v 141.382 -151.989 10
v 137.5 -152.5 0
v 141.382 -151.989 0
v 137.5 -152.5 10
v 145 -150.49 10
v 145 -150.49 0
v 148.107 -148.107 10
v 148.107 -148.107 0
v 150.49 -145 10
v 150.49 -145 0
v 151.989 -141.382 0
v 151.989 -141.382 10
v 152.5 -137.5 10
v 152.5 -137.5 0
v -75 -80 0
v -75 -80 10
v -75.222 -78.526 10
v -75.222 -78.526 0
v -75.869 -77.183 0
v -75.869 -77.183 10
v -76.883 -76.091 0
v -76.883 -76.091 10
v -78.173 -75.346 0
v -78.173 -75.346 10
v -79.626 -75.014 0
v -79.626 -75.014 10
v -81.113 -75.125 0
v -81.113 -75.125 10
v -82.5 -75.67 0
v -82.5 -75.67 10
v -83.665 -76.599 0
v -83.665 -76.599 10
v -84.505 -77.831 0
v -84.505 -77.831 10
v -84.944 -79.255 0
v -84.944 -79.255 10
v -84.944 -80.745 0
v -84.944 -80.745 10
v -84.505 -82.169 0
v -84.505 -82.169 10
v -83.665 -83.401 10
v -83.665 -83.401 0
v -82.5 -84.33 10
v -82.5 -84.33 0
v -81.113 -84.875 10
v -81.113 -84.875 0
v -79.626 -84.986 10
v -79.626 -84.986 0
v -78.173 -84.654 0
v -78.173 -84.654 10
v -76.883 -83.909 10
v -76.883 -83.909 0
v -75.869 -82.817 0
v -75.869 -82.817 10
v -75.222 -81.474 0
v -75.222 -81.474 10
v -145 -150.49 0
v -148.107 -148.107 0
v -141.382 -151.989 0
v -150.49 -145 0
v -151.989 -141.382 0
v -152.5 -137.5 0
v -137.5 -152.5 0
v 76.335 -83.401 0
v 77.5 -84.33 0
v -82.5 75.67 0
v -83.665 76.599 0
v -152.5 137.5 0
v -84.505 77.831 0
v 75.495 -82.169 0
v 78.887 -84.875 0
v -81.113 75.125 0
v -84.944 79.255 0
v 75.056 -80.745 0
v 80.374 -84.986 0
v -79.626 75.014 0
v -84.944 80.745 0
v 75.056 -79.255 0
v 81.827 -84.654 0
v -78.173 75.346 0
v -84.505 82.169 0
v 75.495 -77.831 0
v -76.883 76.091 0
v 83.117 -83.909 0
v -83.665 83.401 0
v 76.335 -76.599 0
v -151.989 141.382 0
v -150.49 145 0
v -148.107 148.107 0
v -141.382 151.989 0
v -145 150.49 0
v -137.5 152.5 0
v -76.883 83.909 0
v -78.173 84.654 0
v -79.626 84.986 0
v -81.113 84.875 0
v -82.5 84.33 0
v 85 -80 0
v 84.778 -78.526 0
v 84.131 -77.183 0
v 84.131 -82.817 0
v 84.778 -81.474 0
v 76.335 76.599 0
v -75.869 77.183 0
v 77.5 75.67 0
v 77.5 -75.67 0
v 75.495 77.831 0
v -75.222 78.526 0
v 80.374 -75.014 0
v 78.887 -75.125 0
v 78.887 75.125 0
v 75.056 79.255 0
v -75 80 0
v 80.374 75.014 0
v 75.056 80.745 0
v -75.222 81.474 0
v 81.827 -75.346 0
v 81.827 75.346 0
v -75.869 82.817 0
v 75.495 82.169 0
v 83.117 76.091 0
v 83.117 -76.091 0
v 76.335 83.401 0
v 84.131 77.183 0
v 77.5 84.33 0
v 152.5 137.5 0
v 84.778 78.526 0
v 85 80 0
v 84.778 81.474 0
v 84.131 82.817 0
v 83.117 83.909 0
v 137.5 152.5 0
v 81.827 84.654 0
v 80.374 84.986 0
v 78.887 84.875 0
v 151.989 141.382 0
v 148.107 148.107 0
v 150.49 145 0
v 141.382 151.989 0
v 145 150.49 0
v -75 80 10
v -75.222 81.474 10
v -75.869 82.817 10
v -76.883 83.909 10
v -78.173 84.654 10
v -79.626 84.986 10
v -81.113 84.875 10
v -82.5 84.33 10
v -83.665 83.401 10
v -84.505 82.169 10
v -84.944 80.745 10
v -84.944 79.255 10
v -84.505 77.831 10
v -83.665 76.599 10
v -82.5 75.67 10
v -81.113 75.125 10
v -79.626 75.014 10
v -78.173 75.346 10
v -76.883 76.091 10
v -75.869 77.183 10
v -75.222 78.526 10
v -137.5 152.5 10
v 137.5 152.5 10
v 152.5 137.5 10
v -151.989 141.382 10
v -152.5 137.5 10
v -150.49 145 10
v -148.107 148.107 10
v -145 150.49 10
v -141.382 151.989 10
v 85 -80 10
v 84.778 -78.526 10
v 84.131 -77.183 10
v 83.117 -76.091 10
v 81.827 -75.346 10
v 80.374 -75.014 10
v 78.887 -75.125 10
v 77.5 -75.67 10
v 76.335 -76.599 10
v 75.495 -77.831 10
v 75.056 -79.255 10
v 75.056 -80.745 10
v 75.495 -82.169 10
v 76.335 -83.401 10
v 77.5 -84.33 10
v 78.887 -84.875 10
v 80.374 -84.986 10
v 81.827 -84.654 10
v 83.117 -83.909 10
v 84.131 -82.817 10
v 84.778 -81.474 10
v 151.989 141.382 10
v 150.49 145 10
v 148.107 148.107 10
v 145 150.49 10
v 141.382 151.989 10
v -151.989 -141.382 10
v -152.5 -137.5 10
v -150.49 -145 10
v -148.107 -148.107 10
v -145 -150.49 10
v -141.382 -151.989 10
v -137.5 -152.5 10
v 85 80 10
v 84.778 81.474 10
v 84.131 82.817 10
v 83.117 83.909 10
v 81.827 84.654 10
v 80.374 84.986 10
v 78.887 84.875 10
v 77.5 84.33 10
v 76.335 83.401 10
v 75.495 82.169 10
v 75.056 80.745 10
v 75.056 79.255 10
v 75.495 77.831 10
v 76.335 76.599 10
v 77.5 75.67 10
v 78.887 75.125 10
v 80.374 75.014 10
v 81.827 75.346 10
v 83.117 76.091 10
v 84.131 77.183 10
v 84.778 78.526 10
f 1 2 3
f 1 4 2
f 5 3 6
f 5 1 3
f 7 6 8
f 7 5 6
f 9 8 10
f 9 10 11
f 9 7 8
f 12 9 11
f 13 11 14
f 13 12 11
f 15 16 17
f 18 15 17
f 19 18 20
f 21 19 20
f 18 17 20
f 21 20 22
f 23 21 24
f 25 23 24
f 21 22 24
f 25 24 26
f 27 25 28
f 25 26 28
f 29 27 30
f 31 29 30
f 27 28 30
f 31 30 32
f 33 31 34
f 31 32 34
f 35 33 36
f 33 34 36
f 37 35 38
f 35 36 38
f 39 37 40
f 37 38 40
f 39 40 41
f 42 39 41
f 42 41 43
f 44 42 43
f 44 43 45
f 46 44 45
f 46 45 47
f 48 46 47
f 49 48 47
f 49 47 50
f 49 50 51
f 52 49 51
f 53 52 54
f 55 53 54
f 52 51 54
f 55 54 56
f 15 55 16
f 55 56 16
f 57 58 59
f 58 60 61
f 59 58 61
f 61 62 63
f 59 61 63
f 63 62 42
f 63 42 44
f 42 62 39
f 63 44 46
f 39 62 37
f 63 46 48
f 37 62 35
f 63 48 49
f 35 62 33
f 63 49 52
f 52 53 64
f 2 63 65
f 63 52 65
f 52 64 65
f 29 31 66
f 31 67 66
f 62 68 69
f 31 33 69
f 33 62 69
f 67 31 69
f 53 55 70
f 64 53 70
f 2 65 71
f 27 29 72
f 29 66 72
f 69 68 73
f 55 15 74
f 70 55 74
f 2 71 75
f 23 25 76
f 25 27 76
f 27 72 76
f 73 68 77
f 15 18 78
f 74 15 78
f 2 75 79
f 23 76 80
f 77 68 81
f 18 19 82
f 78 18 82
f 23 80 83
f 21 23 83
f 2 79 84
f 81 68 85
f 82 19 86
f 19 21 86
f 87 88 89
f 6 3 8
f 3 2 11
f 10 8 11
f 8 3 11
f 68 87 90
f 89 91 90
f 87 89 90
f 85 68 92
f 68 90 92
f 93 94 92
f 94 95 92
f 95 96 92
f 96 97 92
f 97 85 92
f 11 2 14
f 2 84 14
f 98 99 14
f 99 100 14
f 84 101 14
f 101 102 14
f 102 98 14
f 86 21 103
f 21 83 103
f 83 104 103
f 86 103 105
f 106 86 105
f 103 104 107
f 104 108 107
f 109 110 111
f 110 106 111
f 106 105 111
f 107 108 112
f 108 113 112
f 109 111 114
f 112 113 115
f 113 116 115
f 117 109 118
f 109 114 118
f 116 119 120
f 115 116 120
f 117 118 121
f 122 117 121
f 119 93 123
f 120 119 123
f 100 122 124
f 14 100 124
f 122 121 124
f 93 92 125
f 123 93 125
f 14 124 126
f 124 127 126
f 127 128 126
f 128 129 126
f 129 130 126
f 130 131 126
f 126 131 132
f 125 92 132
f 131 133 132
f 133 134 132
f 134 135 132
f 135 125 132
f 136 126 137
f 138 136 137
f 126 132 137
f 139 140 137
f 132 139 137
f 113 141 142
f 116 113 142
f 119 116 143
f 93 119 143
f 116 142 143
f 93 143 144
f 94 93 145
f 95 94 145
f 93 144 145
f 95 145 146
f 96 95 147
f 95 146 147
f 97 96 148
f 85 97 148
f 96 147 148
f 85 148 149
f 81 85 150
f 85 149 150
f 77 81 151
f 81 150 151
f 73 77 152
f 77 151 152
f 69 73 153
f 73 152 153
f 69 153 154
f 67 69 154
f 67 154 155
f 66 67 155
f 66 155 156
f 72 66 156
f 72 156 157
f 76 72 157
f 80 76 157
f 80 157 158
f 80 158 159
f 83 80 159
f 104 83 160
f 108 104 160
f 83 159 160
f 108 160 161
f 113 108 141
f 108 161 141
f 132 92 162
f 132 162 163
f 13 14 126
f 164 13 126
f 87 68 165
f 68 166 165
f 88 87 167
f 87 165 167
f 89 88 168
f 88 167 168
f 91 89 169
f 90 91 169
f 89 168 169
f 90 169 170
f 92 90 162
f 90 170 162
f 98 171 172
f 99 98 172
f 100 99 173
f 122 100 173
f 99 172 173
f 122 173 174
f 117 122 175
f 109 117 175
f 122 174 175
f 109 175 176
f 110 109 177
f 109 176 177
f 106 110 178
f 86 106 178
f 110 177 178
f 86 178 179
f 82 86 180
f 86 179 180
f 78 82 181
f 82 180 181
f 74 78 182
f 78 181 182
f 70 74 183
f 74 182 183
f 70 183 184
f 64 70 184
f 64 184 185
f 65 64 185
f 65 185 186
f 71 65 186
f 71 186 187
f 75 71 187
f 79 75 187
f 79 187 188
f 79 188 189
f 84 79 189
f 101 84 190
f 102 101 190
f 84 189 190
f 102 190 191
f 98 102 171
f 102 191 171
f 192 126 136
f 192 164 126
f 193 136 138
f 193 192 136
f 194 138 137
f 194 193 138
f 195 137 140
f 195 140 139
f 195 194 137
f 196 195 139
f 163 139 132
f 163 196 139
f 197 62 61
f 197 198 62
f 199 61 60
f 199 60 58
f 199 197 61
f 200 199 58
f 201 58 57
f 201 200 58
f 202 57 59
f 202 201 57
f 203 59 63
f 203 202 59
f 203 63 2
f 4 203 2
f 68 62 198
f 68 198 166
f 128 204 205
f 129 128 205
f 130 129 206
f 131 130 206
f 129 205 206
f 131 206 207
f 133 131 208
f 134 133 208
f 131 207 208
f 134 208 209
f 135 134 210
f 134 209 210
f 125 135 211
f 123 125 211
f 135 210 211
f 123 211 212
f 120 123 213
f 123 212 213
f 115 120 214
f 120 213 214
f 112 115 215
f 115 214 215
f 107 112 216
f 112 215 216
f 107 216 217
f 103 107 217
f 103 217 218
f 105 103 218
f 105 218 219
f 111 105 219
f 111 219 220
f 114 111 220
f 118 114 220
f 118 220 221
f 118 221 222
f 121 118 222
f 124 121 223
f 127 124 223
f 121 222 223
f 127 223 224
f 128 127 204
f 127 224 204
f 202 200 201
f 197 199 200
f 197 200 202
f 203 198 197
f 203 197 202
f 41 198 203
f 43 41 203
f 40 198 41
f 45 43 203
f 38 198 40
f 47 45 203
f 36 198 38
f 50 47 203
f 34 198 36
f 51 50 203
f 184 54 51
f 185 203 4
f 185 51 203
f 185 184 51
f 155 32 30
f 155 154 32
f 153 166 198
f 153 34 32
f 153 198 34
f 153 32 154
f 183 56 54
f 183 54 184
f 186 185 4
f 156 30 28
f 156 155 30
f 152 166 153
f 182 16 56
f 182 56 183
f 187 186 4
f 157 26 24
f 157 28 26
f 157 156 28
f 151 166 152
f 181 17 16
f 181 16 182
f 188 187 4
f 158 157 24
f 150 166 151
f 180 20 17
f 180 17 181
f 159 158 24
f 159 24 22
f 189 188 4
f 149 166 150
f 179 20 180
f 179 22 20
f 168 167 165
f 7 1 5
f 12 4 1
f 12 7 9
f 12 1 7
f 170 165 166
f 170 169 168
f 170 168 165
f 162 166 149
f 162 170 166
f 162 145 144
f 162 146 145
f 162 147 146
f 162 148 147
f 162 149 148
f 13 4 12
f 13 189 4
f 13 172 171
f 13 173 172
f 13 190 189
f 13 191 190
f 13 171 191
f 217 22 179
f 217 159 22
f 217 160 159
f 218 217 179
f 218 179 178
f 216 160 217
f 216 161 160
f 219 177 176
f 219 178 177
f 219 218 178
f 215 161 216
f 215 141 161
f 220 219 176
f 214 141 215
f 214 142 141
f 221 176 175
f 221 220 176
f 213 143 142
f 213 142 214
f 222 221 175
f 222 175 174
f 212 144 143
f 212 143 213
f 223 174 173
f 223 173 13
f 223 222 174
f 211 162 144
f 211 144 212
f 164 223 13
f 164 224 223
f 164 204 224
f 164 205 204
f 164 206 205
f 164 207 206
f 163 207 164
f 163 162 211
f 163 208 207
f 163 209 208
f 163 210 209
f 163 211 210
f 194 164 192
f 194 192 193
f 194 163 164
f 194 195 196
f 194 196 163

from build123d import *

# Parameters (mm, degrees)
ESQUISSE1_W              = 305
ESQUISSE1_H              = 305
BOSS_EXTRU_1_DEPTH       = 10
CONG_2_R                 = 15
ESQUISSE3_R              = 5
ENL_V_MAT_EXTRU_11_DEPTH = 10


with BuildPart() as part:
    # Esquisse1 → Boss.-Extru.1 (new body)
    with BuildSketch(Plane.XY):
        Rectangle(ESQUISSE1_W, ESQUISSE1_H)
    extrude(amount=BOSS_EXTRU_1_DEPTH)

    # Congé2
    cong_2_edges = [part.edges().sort_by_distance(p)[0] for p in [
        (-152.5, 152.5, 5),
        (152.5, 152.5, 5),
        (152.5, -152.5, 5),
        (-152.5, -152.5, 5),
    ]]
    fillet(cong_2_edges, radius=CONG_2_R)

    # Esquisse3 → Enlèv. mat.-Extru.11 (cut)
    with BuildSketch(Plane.XY.offset(10)):
        with Locations((80, 80)):
            Circle(ESQUISSE3_R)
        with Locations((80, -80)):
            Circle(ESQUISSE3_R)
        with Locations((-80, -80)):
            Circle(ESQUISSE3_R)
        with Locations((-80, 80)):
            Circle(ESQUISSE3_R)
    extrude(amount=-ENL_V_MAT_EXTRU_11_DEPTH, mode=Mode.SUBTRACT)


solid = part.part
